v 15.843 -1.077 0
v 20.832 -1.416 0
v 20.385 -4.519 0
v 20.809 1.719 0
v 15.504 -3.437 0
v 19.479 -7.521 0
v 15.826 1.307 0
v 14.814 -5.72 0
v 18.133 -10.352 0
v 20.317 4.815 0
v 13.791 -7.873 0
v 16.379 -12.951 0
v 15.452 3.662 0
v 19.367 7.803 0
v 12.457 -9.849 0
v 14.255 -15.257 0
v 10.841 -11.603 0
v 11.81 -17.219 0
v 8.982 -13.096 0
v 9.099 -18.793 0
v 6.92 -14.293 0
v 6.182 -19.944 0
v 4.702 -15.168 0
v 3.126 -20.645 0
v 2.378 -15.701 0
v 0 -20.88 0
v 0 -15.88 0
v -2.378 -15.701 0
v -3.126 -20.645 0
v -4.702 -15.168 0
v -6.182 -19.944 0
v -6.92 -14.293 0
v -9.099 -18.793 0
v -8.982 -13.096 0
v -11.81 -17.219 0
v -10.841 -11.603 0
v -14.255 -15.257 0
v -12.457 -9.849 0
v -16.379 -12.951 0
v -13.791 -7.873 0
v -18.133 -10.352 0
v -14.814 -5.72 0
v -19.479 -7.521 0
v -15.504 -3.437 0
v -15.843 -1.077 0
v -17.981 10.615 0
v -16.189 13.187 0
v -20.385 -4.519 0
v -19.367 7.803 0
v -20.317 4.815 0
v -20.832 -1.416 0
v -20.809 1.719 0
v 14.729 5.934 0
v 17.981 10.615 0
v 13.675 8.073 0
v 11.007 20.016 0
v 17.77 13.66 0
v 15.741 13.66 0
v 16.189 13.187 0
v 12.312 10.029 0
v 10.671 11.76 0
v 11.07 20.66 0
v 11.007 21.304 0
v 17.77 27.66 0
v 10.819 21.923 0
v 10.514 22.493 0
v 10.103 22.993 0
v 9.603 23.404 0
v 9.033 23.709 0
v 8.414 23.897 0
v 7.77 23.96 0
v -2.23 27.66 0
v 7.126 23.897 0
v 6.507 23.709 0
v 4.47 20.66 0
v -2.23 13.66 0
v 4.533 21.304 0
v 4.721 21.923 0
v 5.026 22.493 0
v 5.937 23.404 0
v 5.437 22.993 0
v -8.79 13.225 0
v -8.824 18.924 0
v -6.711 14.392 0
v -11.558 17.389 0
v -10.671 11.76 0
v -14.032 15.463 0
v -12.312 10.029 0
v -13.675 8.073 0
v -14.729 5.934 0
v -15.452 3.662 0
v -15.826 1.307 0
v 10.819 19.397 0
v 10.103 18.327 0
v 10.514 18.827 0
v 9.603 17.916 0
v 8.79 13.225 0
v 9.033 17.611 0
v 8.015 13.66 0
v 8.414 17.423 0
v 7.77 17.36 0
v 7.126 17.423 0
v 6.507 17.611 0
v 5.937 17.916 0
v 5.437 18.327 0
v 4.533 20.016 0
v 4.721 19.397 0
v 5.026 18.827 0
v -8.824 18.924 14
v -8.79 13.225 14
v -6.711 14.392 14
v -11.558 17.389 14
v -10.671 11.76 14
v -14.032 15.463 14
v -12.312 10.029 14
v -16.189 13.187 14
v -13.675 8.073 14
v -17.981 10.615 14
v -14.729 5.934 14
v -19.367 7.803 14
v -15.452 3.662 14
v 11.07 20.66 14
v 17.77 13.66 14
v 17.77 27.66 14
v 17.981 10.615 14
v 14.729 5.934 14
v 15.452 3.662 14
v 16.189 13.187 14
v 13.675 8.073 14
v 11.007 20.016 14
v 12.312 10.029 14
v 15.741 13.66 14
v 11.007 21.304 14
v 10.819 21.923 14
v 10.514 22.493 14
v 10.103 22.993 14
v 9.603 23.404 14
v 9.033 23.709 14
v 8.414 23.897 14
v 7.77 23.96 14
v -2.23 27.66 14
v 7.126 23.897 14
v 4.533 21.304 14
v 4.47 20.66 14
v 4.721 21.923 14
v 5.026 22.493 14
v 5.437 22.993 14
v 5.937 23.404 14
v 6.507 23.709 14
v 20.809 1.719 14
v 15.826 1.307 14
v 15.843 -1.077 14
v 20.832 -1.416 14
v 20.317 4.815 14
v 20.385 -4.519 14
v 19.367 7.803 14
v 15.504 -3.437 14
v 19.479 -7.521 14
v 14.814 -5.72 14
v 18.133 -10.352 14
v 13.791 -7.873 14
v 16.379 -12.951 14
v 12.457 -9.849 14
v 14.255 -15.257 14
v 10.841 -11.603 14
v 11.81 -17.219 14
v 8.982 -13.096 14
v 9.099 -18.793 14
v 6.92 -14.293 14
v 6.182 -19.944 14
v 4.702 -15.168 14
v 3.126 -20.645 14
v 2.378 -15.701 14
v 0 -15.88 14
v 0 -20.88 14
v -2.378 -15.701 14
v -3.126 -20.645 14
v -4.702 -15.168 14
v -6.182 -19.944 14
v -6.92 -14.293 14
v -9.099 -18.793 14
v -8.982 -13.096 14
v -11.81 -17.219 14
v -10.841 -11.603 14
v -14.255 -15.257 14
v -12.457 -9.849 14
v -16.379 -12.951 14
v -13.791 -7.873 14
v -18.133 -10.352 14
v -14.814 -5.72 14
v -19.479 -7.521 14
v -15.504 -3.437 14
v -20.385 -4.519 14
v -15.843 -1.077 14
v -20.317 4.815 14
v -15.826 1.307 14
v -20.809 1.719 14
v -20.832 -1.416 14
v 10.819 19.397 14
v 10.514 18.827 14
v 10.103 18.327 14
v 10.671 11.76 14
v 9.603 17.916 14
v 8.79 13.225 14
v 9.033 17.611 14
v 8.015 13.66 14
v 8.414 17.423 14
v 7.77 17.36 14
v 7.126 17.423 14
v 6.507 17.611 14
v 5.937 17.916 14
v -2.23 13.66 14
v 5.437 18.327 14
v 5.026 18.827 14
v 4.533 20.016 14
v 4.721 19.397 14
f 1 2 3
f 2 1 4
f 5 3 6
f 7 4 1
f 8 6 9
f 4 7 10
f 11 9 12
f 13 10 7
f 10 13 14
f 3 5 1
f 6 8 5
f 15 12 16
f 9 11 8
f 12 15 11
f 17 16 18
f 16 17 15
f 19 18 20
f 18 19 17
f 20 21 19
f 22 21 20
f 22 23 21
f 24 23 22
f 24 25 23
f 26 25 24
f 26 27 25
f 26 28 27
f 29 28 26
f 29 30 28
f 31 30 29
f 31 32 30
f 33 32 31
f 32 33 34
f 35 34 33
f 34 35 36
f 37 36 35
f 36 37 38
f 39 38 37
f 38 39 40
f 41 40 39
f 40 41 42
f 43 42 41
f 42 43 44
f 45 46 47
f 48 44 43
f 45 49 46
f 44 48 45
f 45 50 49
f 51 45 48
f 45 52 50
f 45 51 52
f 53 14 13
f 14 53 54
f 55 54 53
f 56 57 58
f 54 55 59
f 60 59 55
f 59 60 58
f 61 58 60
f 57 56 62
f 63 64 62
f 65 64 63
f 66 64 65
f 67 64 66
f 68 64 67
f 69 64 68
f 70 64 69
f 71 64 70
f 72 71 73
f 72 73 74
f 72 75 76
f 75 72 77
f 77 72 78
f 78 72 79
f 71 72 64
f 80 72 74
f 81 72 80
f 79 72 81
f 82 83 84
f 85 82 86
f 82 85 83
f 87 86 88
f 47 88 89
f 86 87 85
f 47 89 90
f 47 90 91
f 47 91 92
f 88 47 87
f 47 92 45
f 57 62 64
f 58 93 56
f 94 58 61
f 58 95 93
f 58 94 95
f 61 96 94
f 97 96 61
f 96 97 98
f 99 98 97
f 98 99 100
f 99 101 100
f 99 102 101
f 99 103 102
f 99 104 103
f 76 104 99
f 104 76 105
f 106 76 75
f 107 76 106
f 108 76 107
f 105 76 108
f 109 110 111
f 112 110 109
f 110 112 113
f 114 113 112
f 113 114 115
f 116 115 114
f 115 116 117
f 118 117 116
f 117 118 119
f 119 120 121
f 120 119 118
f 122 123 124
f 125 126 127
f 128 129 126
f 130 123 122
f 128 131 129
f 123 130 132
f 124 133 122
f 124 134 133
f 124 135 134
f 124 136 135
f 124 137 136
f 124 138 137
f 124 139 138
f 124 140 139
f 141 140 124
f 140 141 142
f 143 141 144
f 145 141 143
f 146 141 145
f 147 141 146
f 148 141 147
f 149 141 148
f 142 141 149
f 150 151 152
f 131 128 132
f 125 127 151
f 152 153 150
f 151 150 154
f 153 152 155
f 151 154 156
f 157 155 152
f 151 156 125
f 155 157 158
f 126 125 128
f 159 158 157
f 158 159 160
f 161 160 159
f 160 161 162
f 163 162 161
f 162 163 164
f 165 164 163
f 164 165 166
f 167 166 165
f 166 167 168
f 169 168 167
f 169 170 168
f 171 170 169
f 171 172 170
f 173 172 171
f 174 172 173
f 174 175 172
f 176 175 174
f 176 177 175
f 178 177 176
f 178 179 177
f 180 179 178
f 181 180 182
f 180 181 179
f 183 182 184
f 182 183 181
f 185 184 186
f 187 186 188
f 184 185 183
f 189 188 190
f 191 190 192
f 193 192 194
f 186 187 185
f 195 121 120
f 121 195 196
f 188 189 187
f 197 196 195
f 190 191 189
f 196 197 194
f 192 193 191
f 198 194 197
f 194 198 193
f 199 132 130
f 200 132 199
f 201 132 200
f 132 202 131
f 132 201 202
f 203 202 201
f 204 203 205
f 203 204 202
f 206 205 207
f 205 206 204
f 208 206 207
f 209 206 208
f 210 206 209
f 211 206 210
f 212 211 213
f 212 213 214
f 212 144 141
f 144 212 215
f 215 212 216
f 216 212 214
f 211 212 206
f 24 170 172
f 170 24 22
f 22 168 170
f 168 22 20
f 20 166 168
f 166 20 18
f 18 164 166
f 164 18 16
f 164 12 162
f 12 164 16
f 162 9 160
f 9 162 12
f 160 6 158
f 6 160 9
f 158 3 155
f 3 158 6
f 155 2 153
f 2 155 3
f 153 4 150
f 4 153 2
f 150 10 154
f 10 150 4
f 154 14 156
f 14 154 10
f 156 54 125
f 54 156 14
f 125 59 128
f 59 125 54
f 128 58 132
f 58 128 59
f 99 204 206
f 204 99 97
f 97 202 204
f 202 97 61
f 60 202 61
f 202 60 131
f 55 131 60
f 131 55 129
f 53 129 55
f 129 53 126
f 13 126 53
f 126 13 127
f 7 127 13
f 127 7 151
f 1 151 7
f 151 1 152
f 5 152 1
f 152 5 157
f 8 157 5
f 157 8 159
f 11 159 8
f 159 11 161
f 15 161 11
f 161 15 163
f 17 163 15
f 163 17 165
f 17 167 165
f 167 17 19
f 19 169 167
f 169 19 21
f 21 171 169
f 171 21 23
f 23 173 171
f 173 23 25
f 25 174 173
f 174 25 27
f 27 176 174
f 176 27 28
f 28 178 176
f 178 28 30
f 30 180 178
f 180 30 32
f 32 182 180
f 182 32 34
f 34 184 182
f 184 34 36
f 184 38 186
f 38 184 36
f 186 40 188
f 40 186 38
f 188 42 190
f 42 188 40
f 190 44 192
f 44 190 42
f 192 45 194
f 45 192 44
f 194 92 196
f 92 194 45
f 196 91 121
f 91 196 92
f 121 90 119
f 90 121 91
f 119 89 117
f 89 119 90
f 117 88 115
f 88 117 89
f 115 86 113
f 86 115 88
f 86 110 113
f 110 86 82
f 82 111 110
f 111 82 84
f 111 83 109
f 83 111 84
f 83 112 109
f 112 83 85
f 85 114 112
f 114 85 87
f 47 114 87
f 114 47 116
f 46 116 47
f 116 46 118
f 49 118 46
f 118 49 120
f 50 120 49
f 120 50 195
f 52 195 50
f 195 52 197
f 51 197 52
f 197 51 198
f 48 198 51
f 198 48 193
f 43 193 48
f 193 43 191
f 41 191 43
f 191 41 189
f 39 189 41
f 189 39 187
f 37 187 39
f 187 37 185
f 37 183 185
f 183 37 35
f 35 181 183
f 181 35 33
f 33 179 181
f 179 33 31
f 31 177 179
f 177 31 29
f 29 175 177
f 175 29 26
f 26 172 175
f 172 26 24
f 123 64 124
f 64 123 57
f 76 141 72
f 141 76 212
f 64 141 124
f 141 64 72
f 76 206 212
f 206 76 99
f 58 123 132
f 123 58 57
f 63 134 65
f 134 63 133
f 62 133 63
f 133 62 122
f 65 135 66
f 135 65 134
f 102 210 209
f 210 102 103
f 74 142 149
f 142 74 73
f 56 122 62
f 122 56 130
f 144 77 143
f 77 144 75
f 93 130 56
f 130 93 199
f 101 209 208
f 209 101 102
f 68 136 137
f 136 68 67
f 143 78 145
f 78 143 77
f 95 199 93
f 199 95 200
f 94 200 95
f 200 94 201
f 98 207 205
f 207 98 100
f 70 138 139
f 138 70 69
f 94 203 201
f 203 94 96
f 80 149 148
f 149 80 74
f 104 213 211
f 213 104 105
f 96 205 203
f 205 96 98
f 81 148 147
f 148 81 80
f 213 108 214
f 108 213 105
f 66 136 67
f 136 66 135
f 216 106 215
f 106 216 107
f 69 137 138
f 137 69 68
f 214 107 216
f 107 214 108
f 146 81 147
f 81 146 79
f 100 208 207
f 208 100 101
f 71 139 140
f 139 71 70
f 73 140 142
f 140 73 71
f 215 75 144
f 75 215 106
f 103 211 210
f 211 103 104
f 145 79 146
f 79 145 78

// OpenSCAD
$fn = 32;

// ----------------------------------------------------------------------
// Pipe clamp: 41.76 mm ring, 5 mm wall, 14 mm wide
// ----------------------------------------------------------------------

// --- parameters (mm) ---
outer_r = 20.88;          // clamp outside radius
inner_r = 15.88;          // pipe bore radius
band = 5;                 // band thickness
clamp_w = 14;             // clamp width
opening = 50;             // opening angle between the ends
lug_w = 20;               // lug width
lug_len = 14;             // lug length
bolt_d = 6.6;             // bolt hole

clamp_profile = [[-8.824, 18.924], [-11.558, 17.389], [-14.032, 15.463], [-16.189, 13.187], [-17.981, 10.615], [-19.367, 7.803], [-20.317, 4.815], [-20.809, 1.719], [-20.832, -1.416], [-20.385, -4.519], [-19.479, -7.521], [-18.133, -10.352], [-16.379, -12.951], [-14.255, -15.257], [-11.81, -17.219], [-9.099, -18.793], [-6.182, -19.944], [-3.126, -20.645], [0, -20.88], [3.126, -20.645], [6.182, -19.944], [9.099, -18.793], [11.81, -17.219], [14.255, -15.257], [16.379, -12.951], [18.133, -10.352], [19.479, -7.521], [20.385, -4.519], [20.832, -1.416], [20.809, 1.719], [20.317, 4.815], [19.367, 7.803], [17.981, 10.615], [16.189, 13.187], [14.032, 15.463], [11.558, 17.389], [8.824, 18.924], [6.711, 14.392], [8.79, 13.225], [10.671, 11.76], [12.312, 10.029], [13.675, 8.073], [14.729, 5.934], [15.452, 3.662], [15.826, 1.307], [15.843, -1.077], [15.504, -3.437], [14.814, -5.72], [13.791, -7.873], [12.457, -9.849], [10.841, -11.603], [8.982, -13.096], [6.92, -14.293], [4.702, -15.168], [2.378, -15.701], [0, -15.88], [-2.378, -15.701], [-4.702, -15.168], [-6.92, -14.293], [-8.982, -13.096], [-10.841, -11.603], [-12.457, -9.849], [-13.791, -7.873], [-14.814, -5.72], [-15.504, -3.437], [-15.843, -1.077], [-15.826, 1.307], [-15.452, 3.662], [-14.729, 5.934], [-13.675, 8.073], [-12.312, 10.029], [-10.671, 11.76], [-8.79, 13.225], [-6.711, 14.392]];

difference() {
  union() {
    linear_extrude(height = clamp_w) polygon(clamp_profile);
    /* bolt lug on the other end */
    translate([-2.23, 13.66, 0]) cube([lug_w, 14, clamp_w]);
  }
  translate([7.77, 20.66, -2.5]) cylinder(h = clamp_w + 5, d = bolt_d);
}
